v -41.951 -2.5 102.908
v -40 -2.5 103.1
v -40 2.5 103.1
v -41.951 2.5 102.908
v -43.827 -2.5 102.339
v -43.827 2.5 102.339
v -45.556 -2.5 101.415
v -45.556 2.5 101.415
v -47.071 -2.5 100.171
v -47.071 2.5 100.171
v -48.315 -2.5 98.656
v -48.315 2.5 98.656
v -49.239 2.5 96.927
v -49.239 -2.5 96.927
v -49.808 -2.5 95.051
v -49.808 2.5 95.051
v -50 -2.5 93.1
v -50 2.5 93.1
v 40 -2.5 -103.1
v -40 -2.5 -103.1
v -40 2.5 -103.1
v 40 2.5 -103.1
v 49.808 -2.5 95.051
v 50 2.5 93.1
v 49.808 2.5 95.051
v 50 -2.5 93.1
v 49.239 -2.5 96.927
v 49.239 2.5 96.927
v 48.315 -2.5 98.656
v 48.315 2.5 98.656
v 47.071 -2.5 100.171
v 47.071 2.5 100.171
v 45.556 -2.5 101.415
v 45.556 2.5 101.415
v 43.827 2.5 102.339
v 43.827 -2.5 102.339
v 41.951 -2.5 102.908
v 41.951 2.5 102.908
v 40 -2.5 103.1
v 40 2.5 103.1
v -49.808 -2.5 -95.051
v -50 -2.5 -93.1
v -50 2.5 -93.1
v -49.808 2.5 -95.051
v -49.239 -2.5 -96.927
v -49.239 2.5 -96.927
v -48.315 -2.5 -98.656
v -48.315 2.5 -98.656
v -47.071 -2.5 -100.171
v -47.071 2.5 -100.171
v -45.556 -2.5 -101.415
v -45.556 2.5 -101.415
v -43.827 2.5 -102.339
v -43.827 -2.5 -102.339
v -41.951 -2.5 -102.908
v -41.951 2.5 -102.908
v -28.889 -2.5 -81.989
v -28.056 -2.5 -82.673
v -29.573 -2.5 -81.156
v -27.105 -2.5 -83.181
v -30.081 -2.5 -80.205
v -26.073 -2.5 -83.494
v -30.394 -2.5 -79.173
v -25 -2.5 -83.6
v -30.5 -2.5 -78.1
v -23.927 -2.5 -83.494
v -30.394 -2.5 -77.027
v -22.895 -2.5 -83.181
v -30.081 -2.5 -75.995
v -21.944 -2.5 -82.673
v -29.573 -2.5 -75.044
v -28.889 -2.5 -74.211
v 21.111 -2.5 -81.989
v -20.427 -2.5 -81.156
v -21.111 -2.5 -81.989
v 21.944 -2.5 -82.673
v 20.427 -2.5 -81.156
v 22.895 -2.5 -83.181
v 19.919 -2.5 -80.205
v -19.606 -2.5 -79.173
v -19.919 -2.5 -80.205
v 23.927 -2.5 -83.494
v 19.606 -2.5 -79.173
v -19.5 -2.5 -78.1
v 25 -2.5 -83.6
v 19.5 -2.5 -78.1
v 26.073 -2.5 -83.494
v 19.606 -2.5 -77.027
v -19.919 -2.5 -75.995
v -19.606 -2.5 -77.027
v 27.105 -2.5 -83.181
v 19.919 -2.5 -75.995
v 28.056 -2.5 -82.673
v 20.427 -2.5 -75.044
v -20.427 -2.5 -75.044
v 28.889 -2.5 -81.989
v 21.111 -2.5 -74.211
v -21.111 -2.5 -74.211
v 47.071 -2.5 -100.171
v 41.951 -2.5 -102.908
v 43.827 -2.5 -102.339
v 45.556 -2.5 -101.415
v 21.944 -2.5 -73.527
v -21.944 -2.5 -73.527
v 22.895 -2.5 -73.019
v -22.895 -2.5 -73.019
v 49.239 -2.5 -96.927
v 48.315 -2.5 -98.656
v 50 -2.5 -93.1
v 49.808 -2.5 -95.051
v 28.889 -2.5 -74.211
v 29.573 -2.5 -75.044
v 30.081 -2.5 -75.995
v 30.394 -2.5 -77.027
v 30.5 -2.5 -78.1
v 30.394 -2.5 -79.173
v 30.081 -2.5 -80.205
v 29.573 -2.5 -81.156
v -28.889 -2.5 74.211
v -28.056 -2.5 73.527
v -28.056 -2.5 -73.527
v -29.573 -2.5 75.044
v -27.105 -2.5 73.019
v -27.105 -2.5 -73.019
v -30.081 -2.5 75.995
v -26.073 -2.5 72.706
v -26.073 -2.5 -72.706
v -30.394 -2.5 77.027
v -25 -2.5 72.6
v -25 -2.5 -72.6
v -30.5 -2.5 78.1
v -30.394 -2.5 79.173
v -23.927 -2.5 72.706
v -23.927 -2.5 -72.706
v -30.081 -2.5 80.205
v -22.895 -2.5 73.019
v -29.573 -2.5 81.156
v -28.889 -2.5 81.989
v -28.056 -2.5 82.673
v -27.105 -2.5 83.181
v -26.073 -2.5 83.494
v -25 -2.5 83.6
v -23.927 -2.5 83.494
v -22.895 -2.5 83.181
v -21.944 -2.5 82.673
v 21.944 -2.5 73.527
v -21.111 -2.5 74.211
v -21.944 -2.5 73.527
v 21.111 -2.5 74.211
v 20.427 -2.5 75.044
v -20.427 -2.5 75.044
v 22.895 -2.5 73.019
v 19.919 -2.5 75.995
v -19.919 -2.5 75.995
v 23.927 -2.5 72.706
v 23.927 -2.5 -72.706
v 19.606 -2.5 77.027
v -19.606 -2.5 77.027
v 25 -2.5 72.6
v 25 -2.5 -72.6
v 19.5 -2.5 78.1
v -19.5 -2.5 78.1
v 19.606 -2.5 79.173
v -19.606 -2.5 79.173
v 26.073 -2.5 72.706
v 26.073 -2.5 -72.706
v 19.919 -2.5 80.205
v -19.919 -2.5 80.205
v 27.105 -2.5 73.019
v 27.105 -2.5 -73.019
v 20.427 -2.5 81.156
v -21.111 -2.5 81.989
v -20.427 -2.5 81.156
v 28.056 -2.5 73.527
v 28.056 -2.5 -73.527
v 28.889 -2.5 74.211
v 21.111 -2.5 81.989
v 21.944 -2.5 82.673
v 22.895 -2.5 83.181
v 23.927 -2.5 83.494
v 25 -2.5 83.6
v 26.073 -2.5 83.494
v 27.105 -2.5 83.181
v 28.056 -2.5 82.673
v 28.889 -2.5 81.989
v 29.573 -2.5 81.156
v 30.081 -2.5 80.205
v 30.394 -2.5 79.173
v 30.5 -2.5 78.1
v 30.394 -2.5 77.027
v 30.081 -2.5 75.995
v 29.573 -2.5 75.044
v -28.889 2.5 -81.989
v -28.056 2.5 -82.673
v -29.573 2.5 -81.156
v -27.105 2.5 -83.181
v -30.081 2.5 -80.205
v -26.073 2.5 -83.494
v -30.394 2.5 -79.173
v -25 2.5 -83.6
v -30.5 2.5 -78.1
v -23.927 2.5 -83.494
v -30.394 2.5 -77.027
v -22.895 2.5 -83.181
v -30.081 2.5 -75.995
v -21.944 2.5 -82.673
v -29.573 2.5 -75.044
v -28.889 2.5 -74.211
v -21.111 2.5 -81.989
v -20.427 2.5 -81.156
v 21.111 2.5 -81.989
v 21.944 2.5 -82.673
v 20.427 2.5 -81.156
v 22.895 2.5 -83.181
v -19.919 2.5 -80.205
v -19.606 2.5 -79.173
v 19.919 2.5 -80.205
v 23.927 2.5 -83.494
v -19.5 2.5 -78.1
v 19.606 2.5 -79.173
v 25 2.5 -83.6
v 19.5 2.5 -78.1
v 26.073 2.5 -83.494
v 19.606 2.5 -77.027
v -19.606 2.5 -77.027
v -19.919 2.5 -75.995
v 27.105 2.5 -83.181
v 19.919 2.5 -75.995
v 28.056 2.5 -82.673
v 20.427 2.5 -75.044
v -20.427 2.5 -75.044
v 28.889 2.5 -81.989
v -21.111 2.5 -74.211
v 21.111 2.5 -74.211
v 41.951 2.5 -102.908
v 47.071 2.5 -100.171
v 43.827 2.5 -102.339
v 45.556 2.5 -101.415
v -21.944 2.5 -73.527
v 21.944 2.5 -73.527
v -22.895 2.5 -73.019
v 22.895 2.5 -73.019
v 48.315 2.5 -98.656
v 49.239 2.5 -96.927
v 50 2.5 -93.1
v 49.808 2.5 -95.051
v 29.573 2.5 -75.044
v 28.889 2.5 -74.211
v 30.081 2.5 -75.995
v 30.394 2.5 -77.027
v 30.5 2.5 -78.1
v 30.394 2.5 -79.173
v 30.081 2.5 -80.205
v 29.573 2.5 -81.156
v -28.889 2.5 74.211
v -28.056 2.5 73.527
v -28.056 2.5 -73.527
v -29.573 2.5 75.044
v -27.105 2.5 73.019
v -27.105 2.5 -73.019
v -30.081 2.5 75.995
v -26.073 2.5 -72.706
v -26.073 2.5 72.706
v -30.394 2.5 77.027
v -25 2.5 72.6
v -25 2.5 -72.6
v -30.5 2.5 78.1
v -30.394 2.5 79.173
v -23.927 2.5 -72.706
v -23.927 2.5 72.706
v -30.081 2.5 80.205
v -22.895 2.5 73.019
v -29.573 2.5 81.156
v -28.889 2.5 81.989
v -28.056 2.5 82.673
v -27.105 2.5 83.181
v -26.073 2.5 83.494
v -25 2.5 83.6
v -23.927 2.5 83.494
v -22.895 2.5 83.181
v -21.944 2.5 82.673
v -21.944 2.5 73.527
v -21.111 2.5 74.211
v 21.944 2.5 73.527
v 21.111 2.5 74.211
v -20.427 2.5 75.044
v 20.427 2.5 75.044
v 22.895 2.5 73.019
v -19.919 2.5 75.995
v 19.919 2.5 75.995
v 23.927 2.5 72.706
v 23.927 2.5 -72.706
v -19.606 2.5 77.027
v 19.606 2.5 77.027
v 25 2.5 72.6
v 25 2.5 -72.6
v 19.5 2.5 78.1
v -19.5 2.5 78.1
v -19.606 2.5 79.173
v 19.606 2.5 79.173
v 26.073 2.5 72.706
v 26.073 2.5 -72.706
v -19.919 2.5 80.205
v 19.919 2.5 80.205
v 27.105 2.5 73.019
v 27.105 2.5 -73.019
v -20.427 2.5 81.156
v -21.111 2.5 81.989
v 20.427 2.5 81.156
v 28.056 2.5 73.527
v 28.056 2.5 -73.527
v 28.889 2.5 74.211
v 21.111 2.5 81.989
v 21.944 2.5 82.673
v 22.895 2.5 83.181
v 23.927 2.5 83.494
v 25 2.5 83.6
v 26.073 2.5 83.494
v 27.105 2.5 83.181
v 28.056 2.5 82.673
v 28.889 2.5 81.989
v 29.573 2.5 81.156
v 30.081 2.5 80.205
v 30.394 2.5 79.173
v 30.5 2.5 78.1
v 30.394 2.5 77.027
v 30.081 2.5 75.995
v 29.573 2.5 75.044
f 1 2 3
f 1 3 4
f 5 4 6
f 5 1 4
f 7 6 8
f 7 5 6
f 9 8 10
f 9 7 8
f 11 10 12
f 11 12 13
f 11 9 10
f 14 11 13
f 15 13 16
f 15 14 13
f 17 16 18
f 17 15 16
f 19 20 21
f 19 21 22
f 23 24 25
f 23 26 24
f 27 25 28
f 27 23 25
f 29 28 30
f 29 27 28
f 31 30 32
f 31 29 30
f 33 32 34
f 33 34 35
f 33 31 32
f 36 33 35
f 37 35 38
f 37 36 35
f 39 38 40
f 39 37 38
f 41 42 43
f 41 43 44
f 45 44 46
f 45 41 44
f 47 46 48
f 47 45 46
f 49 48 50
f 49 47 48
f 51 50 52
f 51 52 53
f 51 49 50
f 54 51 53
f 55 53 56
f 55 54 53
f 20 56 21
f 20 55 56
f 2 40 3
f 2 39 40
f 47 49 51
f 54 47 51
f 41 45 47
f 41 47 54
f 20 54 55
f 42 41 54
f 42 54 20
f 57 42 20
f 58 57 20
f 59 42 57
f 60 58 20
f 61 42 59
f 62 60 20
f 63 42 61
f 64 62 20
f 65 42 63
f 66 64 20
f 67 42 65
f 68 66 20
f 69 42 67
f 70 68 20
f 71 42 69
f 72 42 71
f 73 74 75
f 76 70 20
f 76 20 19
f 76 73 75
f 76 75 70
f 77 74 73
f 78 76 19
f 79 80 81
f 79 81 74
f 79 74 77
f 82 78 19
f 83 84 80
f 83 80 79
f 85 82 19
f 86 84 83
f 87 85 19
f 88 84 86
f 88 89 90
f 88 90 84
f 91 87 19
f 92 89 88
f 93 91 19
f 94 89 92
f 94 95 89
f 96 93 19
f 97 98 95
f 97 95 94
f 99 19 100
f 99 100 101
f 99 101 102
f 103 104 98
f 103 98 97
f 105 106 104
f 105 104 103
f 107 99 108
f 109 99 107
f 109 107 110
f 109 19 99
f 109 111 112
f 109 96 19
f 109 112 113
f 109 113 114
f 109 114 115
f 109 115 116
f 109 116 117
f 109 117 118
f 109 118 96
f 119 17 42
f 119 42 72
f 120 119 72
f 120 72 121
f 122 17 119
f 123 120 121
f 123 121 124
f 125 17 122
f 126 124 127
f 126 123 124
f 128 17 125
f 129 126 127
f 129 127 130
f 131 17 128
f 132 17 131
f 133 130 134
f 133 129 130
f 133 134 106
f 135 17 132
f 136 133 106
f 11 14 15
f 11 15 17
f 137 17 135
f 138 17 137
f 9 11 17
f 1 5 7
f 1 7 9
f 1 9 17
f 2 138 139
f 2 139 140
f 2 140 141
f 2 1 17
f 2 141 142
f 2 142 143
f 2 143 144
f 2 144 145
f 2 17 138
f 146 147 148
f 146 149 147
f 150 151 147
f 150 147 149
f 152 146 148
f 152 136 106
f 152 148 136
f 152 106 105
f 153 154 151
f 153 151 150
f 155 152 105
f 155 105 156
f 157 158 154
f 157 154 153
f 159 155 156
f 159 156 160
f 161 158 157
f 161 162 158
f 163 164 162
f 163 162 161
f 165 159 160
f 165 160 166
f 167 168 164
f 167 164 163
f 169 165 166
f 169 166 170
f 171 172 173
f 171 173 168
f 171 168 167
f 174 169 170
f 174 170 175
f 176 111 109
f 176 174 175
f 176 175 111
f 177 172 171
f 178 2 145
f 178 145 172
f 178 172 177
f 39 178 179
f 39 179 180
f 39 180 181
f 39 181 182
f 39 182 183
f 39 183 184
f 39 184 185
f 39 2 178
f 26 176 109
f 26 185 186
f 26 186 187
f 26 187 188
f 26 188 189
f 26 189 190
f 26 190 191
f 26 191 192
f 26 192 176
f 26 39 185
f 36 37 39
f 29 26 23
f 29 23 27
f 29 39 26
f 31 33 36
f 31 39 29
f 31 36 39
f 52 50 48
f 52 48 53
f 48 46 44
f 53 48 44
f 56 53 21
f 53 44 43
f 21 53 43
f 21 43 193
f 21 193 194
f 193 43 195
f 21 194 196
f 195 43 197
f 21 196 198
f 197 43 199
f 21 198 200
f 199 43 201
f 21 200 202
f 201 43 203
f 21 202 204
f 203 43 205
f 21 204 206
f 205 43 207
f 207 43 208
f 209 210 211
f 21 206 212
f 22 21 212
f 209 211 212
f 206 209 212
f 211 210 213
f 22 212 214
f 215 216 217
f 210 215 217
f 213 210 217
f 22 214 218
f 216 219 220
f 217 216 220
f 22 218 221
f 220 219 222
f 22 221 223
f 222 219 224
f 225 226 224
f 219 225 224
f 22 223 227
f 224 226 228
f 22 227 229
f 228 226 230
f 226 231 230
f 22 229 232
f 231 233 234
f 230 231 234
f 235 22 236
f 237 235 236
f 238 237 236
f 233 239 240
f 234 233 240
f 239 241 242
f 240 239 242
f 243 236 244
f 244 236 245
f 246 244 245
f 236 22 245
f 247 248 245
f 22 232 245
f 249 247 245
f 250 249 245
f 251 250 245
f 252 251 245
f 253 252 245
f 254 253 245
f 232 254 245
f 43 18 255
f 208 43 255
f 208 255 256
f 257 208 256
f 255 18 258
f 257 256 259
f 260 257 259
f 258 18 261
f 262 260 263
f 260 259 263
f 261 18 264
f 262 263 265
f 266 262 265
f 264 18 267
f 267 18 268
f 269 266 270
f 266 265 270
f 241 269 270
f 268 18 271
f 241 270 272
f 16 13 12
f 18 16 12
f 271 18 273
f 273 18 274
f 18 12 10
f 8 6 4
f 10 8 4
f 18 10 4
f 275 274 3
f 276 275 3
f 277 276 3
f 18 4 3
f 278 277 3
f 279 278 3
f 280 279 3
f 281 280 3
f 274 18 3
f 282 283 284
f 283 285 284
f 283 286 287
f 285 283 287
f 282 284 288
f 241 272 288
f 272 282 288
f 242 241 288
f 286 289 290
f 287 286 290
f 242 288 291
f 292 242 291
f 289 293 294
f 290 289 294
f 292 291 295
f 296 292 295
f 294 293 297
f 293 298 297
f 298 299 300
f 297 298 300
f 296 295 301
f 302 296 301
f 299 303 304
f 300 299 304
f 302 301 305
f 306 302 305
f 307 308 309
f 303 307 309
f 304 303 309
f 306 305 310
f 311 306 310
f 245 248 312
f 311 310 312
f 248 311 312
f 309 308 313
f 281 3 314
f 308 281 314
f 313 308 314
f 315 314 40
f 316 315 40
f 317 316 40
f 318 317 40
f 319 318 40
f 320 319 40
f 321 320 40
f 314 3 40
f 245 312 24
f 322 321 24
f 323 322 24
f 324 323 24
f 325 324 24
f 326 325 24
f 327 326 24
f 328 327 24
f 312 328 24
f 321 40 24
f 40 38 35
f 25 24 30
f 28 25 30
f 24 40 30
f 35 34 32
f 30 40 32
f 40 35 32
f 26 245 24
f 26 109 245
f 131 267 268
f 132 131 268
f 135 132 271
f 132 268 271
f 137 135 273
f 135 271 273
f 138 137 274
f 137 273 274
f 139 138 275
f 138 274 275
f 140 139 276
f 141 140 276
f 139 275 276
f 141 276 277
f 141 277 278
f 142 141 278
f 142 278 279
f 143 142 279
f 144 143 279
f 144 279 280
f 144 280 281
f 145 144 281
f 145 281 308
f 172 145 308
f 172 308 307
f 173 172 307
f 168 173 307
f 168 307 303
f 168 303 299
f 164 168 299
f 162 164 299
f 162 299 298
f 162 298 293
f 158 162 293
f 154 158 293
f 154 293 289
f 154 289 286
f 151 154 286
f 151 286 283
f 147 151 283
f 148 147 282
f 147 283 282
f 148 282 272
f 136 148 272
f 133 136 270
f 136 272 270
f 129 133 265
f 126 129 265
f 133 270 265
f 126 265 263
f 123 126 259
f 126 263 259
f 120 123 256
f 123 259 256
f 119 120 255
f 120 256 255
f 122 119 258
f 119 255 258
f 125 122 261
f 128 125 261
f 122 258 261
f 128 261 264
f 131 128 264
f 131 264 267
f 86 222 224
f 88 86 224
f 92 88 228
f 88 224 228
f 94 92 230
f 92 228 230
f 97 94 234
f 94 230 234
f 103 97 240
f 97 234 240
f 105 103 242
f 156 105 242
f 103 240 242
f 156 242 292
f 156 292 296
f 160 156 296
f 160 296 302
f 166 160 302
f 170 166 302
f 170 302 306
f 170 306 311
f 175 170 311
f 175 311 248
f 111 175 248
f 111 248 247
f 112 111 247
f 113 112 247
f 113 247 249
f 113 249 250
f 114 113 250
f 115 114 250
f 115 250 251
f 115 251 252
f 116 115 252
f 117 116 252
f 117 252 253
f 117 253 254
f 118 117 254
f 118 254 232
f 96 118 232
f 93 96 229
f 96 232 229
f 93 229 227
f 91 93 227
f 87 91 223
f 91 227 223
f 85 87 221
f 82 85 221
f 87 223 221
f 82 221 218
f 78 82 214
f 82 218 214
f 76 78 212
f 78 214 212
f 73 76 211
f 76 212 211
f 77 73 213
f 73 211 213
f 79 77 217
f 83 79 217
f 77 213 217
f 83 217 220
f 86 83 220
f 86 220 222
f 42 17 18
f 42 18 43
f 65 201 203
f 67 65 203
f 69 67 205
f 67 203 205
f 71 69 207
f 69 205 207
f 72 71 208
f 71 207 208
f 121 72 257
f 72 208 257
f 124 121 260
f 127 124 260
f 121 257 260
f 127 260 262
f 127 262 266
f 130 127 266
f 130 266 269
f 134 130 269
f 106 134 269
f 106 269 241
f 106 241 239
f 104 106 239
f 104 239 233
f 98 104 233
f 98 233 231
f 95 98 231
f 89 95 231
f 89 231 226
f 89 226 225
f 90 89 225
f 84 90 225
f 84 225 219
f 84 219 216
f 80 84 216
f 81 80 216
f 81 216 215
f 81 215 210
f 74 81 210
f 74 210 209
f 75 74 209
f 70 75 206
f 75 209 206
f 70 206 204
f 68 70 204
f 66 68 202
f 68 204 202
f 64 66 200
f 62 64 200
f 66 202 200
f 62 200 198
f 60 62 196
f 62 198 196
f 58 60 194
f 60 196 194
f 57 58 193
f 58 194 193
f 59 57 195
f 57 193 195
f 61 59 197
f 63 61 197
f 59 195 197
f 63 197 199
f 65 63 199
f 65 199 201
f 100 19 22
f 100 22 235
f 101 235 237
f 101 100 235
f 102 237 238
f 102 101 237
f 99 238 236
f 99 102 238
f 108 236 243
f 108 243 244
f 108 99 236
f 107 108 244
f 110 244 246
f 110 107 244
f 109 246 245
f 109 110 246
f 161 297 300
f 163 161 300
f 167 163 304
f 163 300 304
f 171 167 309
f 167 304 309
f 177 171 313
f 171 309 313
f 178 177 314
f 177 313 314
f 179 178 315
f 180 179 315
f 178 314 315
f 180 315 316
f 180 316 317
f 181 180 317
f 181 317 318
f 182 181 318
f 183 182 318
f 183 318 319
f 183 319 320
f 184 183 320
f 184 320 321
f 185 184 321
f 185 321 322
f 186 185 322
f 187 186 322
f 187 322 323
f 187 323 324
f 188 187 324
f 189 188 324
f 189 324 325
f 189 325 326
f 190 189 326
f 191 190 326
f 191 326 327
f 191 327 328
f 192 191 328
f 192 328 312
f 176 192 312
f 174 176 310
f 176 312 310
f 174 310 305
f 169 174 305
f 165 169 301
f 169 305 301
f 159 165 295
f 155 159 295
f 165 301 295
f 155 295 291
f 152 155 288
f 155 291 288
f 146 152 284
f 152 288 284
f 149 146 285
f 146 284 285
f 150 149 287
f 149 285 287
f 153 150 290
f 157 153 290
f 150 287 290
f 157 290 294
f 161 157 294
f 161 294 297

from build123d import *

# Parameters (mm, degrees)
F1_DEPTH = 2.5
F3_D     = 11
F3_DEPTH = 24.5
F3_TIP   = 3.3047334047


with BuildPart() as f1:
    # F0 (on Front) → F1 (new body, symmetric)
    with BuildSketch(Plane.XZ):
        with BuildLine():
            Line((40, 103.1), (-40, 103.1))
            ThreePointArc((-40, 103.1), (-47.0710678119, 100.1710678119), (-50, 93.1))
            Line((-50, 93.1), (-50, -93.1))
            ThreePointArc((-50, -93.1), (-47.0710678119, -100.1710678119), (-40, -103.1))
            Line((-40, -103.1), (40, -103.1))
            ThreePointArc((40, -103.1), (47.0710678119, -100.1710678119), (50, -93.1))
            Line((50, -93.1), (50, 93.1))
            ThreePointArc((50, 93.1), (47.0710678119, 100.1710678119), (40, 103.1))
        make_face()
    extrude(amount=F1_DEPTH, both=True)

    # F3
    with Locations(Plane.XZ.offset(2.5)):
        with Locations((-25, 78.1), (25, 78.1), (25, -78.1), (-25, -78.1)):
            Hole(F3_D / 2, depth=F3_DEPTH)
            with Locations((0, 0, -(F3_DEPTH + F3_TIP / 2))):  # 118° drill point
                Cone(0, F3_D / 2, F3_TIP, mode=Mode.SUBTRACT)


solid = f1.part
